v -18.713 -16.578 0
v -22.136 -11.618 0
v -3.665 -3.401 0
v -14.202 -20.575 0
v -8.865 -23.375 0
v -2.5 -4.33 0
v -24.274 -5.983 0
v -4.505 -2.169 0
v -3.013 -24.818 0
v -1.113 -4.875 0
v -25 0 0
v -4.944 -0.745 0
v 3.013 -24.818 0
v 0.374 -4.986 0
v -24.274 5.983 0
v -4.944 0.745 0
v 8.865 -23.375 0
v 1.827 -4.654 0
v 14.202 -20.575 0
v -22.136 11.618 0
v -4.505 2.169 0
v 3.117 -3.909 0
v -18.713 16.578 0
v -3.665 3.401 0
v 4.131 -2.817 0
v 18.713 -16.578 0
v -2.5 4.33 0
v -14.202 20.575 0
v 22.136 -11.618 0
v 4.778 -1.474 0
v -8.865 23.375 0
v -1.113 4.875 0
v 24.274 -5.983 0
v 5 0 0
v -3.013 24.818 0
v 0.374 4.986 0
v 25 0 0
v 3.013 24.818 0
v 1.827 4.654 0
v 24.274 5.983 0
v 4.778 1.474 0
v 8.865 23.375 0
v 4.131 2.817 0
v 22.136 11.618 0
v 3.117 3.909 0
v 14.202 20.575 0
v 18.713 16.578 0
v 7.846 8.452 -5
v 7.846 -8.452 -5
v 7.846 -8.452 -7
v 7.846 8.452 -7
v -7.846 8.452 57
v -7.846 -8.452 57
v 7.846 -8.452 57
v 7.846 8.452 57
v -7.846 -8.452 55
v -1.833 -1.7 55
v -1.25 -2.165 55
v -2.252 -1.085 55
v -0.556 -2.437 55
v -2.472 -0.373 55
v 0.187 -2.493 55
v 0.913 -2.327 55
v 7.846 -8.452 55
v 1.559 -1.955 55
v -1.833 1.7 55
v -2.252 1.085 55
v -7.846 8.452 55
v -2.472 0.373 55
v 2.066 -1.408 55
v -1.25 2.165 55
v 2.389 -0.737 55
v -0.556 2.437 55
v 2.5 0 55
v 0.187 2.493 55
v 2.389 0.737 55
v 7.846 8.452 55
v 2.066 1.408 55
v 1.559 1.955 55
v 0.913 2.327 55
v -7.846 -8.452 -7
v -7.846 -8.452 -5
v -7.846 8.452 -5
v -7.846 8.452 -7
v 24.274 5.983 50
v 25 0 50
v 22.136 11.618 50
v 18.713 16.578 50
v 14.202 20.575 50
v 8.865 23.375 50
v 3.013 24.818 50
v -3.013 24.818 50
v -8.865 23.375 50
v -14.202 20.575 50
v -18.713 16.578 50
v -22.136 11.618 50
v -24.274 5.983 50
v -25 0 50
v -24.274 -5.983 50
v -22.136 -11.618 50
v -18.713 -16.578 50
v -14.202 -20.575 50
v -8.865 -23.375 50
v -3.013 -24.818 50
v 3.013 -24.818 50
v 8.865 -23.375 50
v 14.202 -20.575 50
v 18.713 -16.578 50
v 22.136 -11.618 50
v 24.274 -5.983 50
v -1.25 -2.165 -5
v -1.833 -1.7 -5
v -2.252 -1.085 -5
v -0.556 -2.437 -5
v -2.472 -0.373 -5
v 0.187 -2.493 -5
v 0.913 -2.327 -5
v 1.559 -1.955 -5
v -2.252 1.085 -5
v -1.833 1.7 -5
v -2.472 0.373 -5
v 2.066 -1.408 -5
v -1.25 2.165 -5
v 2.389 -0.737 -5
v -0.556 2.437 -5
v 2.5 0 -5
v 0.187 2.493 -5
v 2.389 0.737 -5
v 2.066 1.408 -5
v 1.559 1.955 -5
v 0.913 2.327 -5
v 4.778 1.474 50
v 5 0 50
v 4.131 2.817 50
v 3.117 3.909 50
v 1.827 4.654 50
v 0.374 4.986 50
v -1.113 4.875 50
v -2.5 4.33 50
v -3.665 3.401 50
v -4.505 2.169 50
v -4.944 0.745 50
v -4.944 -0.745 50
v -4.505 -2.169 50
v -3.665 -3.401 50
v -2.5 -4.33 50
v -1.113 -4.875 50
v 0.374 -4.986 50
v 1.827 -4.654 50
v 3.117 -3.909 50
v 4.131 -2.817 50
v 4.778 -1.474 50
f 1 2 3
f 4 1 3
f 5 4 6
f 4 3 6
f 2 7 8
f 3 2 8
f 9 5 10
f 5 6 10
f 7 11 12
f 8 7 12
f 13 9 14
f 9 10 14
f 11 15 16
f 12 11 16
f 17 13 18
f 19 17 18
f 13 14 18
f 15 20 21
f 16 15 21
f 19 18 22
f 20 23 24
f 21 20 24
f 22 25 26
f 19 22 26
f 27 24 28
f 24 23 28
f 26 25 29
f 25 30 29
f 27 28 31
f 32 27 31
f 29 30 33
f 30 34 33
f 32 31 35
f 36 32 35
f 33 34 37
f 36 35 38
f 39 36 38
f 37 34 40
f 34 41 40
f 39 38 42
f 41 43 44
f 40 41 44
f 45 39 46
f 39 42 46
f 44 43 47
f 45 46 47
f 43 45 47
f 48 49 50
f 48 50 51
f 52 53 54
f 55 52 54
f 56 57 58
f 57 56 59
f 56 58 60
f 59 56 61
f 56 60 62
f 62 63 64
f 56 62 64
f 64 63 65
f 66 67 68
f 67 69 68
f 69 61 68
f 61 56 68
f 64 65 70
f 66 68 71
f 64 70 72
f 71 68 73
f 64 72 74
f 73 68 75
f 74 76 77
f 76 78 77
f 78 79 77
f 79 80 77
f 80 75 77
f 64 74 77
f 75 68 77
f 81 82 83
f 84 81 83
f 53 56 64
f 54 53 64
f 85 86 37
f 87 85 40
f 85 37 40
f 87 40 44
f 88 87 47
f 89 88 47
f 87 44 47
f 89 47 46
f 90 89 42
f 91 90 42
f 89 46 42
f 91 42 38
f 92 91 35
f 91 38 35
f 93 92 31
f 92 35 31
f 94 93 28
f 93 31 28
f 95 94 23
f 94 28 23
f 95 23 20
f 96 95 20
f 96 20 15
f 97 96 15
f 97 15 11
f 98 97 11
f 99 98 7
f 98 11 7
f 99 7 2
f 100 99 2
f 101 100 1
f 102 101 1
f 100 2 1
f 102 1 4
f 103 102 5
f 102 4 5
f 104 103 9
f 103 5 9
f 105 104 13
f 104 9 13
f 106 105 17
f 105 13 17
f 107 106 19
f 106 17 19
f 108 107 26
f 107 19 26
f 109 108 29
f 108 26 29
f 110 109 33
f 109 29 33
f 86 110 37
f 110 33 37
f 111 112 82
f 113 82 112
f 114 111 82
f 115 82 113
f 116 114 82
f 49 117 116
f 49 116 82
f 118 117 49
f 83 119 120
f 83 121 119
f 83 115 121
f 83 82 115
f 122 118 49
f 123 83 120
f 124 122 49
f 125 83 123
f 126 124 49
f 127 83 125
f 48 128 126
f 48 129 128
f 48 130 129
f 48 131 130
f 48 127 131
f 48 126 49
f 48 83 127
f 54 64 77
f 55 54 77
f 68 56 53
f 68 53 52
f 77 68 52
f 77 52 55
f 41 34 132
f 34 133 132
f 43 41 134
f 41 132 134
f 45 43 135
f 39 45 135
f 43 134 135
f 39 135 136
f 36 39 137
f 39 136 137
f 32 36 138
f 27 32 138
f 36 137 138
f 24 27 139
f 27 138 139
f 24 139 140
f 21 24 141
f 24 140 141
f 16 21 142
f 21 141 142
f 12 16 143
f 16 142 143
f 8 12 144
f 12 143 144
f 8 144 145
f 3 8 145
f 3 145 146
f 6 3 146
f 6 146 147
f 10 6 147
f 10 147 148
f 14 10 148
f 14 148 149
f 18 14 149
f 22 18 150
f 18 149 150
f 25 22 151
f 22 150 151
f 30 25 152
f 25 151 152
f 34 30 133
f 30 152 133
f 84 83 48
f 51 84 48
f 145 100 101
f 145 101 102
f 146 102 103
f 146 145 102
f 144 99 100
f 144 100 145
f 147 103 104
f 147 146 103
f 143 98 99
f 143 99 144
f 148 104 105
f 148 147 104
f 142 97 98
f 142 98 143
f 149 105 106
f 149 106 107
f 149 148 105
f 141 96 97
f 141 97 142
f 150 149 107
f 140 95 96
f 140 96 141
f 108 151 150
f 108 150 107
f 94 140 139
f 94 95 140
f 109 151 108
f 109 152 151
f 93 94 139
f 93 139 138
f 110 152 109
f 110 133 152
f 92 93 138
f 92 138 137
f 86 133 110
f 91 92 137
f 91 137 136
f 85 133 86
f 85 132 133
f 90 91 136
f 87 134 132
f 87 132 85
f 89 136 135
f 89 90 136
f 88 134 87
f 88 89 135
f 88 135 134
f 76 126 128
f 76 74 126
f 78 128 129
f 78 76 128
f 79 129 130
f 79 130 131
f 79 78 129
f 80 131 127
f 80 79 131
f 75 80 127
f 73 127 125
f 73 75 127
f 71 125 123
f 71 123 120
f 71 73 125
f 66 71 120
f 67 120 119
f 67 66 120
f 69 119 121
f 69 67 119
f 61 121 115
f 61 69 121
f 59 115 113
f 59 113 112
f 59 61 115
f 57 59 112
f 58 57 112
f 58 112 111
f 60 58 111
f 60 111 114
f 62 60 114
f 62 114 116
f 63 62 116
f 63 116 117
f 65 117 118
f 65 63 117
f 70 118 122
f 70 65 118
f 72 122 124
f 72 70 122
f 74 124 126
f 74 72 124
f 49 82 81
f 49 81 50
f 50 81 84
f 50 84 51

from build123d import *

# Parameters (mm, degrees)
F0_R     = 25
F1_DEPTH = 50
F3_R     = 5
F4_DEPTH = 25
F5_R     = 2.5
F6_DEPTH = 30
F7_W     = 15.6920365989
F7_H     = 16.9030595571
F7_R     = 2.5
F8_DEPTH = 2


with BuildPart() as f1:
    # F0 (on Top) → F1 (new body)
    with BuildSketch(Plane.XY):
        Circle(F0_R)
    extrude(amount=F1_DEPTH)

    # F3 (on offset) → F4 (cut, symmetric)
    with BuildSketch(Plane.XY.offset(25)):
        Circle(F3_R)
    extrude(amount=F4_DEPTH, both=True, mode=Mode.SUBTRACT)


with BuildPart() as f6:
    # F5 (on offset) → F6 (new body, symmetric)
    with BuildSketch(Plane.XY.offset(25)):
        Circle(F5_R)
    extrude(amount=F6_DEPTH, both=True)

    # F7 (on face) → F8 (join)
    with BuildSketch(Plane.XY.offset(55)):
        Rectangle(F7_W, F7_H)
        Circle(F7_R, mode=Mode.SUBTRACT)
        Circle(F7_R)
    extrude(amount=F8_DEPTH)

    # F9: F6 across plane


with BuildPart() as f6_1:
    add(f6.part)
    add(f6.part.mirror(Plane.XY.offset(25)))


solid = Compound([f1.part, f6_1.part])
